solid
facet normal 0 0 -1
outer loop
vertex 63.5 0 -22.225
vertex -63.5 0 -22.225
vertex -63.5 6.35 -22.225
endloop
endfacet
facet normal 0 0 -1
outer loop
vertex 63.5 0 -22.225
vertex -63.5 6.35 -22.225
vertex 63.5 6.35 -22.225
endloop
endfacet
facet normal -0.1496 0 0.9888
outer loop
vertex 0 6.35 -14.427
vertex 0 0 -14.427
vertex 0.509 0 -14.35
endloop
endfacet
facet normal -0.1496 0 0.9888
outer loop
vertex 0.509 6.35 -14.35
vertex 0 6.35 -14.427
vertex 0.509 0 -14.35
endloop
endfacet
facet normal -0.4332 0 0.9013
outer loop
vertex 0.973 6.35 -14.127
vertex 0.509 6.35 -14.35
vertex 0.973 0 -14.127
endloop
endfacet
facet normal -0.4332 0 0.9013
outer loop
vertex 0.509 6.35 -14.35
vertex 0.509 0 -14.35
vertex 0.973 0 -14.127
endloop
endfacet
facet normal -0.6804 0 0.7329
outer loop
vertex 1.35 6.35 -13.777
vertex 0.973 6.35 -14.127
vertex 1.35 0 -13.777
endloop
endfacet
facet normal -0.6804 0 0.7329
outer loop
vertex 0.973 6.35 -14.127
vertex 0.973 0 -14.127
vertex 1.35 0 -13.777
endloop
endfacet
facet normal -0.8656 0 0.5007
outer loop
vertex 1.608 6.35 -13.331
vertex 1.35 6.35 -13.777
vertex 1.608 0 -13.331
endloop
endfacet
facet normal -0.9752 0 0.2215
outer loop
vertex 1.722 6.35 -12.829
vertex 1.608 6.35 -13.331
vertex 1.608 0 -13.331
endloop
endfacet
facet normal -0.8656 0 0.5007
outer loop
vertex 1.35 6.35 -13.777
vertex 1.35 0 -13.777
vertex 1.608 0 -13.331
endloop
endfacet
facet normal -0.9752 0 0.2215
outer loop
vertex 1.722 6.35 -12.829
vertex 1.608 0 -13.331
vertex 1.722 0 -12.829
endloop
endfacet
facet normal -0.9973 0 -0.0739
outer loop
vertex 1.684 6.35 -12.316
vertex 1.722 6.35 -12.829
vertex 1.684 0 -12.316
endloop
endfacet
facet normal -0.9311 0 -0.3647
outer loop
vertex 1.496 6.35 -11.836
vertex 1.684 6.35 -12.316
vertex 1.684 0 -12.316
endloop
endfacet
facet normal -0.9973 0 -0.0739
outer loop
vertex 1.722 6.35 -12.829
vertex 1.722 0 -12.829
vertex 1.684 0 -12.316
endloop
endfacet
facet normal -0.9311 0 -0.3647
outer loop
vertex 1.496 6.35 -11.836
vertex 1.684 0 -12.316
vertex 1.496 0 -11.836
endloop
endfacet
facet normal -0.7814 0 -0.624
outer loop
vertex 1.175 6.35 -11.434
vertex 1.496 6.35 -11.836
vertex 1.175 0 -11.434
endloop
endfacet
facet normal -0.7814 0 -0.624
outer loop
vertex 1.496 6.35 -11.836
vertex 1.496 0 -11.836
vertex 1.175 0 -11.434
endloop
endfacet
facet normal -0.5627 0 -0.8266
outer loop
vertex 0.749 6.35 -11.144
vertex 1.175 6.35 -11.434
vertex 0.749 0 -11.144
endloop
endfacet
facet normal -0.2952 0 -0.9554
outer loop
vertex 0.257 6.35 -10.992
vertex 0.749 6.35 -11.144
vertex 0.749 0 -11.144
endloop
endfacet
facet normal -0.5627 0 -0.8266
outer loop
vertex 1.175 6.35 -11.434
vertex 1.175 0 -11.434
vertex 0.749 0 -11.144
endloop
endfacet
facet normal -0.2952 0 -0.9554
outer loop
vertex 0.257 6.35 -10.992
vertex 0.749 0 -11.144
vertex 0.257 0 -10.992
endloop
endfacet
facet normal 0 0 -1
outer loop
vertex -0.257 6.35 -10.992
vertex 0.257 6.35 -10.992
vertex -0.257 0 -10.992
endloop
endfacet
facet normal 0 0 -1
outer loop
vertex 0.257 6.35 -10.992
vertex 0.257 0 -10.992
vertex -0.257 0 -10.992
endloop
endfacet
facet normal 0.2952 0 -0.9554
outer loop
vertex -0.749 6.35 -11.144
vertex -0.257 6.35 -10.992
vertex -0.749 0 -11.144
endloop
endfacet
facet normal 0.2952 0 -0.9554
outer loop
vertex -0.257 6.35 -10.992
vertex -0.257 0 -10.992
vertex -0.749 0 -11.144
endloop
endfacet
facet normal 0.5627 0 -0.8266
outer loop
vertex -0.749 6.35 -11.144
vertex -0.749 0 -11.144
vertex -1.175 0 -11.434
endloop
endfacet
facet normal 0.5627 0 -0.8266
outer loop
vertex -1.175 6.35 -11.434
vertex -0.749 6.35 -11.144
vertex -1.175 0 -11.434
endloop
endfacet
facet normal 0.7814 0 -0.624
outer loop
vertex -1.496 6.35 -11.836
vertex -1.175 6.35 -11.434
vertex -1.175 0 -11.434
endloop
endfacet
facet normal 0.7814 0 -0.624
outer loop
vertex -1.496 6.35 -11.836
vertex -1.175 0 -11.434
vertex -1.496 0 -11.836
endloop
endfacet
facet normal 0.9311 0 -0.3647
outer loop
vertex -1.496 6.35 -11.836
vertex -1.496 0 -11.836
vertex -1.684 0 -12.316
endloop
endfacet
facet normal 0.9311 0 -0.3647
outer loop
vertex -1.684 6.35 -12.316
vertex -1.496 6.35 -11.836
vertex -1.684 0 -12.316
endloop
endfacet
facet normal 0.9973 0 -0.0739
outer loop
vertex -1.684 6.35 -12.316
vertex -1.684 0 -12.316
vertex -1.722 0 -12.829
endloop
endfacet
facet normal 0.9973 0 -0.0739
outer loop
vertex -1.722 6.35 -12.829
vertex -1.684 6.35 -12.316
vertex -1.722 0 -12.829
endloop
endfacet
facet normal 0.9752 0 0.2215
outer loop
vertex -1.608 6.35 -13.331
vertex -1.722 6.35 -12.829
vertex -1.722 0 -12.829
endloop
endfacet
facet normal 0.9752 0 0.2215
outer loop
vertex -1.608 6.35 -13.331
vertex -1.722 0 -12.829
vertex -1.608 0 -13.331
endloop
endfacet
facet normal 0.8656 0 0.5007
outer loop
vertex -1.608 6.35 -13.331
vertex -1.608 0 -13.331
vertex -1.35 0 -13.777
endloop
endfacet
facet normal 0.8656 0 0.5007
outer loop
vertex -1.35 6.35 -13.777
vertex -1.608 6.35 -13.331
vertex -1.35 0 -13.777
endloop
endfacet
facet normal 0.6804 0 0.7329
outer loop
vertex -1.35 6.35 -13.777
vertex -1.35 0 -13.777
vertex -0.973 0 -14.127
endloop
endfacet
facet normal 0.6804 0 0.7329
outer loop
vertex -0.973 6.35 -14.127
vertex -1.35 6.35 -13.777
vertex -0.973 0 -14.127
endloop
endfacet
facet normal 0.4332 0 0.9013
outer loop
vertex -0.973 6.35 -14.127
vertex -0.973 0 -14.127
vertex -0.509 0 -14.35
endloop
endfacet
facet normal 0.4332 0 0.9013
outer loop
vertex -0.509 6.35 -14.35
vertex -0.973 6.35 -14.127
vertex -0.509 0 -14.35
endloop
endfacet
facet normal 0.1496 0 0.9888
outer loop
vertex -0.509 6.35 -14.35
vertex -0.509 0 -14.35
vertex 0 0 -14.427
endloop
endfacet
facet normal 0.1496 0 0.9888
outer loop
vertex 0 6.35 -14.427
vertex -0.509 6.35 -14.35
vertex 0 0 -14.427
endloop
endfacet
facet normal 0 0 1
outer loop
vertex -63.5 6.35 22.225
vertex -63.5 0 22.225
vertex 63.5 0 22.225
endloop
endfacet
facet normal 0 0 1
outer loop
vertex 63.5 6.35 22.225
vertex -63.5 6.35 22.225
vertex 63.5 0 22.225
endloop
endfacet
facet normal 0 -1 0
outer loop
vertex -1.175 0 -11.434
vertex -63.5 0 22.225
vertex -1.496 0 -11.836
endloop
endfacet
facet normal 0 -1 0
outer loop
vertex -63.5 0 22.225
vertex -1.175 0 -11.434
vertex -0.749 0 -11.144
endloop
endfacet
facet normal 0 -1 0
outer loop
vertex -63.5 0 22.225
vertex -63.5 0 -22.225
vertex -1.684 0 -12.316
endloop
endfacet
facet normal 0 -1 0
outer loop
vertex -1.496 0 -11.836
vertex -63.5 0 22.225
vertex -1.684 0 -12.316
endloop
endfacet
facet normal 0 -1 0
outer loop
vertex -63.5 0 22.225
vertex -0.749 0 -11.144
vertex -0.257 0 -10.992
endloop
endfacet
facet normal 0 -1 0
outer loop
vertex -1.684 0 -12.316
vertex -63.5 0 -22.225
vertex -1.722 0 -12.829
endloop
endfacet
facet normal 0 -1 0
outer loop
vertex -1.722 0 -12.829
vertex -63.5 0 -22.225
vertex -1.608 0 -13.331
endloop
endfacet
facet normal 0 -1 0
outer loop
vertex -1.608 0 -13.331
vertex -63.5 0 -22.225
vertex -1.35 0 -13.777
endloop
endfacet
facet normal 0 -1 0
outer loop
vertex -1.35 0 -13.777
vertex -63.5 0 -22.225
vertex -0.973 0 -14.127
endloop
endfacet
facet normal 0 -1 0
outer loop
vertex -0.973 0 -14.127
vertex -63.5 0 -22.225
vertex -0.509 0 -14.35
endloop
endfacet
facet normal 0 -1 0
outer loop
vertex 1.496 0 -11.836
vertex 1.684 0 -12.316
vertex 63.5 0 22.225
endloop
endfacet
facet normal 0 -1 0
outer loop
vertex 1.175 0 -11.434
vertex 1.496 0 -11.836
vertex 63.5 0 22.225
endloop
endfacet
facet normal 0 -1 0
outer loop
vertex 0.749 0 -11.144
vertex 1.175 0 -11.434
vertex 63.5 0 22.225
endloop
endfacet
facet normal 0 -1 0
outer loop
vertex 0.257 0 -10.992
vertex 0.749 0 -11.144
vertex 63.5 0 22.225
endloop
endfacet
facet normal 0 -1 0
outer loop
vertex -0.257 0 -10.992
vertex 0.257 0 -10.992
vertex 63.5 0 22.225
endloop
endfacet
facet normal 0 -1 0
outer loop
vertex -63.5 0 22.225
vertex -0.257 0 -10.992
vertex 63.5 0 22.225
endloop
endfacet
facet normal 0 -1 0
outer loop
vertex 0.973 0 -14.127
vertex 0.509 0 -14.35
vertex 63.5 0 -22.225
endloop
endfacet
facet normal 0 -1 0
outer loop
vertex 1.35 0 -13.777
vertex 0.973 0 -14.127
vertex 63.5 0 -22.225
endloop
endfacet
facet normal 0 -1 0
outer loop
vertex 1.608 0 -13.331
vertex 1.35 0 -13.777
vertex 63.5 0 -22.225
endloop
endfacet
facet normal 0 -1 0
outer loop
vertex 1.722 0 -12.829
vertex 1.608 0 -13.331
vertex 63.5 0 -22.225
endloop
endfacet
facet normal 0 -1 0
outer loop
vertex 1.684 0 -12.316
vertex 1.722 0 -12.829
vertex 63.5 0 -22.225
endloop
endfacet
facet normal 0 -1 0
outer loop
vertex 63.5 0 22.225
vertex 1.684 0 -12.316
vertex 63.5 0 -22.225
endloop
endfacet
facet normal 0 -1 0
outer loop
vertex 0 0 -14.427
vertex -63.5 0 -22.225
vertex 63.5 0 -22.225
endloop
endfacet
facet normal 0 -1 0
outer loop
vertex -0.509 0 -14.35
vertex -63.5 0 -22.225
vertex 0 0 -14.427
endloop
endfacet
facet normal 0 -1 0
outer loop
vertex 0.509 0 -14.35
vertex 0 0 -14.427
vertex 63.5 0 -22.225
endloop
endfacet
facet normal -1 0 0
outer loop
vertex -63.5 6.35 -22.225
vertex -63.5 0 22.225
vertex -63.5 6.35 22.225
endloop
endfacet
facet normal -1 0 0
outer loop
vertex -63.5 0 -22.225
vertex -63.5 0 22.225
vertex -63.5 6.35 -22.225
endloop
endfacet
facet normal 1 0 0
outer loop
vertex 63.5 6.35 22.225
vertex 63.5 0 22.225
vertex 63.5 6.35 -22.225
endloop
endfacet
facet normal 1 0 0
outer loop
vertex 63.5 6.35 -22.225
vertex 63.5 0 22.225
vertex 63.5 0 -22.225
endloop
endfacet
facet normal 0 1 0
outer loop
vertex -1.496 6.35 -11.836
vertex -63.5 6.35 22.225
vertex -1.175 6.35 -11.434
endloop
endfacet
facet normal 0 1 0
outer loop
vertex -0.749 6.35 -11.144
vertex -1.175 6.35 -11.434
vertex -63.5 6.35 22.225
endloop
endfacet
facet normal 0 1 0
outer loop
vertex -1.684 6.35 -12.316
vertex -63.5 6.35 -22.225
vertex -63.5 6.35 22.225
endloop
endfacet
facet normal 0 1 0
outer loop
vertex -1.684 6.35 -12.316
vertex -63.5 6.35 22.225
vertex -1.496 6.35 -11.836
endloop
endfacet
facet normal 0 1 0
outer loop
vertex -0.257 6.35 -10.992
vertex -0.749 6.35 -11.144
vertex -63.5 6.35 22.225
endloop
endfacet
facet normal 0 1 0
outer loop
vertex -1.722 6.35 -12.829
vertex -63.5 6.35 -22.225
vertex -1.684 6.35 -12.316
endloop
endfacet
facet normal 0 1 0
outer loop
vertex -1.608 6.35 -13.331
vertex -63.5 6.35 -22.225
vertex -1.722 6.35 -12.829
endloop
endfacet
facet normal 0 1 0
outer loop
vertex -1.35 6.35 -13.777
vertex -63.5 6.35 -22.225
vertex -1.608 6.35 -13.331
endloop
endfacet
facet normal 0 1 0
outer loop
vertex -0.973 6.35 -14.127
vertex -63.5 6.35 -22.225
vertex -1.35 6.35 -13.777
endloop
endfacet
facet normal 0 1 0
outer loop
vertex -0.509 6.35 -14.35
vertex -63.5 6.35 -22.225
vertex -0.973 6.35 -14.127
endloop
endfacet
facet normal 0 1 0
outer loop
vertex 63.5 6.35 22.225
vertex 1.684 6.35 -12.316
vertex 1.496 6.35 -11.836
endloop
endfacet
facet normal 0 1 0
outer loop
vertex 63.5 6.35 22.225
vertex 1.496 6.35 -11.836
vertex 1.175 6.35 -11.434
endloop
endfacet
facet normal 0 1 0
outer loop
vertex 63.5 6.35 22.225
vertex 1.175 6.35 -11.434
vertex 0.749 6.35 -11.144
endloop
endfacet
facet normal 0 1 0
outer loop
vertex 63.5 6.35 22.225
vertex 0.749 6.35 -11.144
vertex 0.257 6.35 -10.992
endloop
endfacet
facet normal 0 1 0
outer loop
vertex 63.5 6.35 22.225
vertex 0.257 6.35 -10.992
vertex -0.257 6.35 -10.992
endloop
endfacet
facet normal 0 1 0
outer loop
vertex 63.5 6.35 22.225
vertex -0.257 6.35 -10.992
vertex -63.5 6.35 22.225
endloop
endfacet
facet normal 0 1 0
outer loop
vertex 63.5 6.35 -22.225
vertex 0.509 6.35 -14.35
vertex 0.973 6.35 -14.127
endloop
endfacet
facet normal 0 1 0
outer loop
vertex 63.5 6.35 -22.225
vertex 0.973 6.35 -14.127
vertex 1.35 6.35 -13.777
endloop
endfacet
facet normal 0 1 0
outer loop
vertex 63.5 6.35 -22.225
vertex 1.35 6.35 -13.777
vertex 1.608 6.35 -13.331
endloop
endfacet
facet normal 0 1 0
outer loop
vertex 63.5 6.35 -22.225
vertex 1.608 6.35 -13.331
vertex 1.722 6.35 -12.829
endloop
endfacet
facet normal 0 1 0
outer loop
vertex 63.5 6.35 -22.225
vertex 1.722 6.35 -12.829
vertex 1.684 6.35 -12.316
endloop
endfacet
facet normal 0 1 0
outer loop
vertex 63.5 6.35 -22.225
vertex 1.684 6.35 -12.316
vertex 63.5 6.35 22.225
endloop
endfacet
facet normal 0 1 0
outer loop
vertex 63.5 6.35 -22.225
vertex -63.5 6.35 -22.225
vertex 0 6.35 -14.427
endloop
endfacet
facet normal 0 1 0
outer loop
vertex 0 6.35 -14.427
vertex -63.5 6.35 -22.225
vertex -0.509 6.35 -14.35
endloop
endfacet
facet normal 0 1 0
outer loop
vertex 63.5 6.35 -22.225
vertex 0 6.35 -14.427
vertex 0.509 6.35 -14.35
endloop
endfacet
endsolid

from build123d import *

# Parameters (mm, degrees)
SKETCH1_W                 = 127
SKETCH1_H                 = 44.45
BOSS_EXTRUDE1_DEPTH       = 6.35
F_8_32_TAPPED_HOLE1_D     = 3.4544
F_8_32_TAPPED_HOLE1_DEPTH = 12.446
F_8_32_TAPPED_HOLE1_TIP   = 1.037806461


with BuildPart() as part:
    # Sketch1 → Boss-Extrude1 (new body)
    with BuildSketch(Plane(origin=(0, 0, 0), x_dir=(1, 0, 0), z_dir=(0, 1, 0))):
        Rectangle(SKETCH1_W, SKETCH1_H)
    extrude(amount=BOSS_EXTRUDE1_DEPTH)

    # #8-32 Tapped Hole1
    with Locations(Plane(origin=(0, 6.35, -12.7), x_dir=(0, 0, 1), z_dir=(0, 1, 0))):
        with Locations((0, 0)):
            Hole(F_8_32_TAPPED_HOLE1_D / 2, depth=F_8_32_TAPPED_HOLE1_DEPTH)
            with Locations((0, 0, -(F_8_32_TAPPED_HOLE1_DEPTH + F_8_32_TAPPED_HOLE1_TIP / 2))):  # 118° drill point
                Cone(0, F_8_32_TAPPED_HOLE1_D / 2, F_8_32_TAPPED_HOLE1_TIP, mode=Mode.SUBTRACT)


solid = part.part
